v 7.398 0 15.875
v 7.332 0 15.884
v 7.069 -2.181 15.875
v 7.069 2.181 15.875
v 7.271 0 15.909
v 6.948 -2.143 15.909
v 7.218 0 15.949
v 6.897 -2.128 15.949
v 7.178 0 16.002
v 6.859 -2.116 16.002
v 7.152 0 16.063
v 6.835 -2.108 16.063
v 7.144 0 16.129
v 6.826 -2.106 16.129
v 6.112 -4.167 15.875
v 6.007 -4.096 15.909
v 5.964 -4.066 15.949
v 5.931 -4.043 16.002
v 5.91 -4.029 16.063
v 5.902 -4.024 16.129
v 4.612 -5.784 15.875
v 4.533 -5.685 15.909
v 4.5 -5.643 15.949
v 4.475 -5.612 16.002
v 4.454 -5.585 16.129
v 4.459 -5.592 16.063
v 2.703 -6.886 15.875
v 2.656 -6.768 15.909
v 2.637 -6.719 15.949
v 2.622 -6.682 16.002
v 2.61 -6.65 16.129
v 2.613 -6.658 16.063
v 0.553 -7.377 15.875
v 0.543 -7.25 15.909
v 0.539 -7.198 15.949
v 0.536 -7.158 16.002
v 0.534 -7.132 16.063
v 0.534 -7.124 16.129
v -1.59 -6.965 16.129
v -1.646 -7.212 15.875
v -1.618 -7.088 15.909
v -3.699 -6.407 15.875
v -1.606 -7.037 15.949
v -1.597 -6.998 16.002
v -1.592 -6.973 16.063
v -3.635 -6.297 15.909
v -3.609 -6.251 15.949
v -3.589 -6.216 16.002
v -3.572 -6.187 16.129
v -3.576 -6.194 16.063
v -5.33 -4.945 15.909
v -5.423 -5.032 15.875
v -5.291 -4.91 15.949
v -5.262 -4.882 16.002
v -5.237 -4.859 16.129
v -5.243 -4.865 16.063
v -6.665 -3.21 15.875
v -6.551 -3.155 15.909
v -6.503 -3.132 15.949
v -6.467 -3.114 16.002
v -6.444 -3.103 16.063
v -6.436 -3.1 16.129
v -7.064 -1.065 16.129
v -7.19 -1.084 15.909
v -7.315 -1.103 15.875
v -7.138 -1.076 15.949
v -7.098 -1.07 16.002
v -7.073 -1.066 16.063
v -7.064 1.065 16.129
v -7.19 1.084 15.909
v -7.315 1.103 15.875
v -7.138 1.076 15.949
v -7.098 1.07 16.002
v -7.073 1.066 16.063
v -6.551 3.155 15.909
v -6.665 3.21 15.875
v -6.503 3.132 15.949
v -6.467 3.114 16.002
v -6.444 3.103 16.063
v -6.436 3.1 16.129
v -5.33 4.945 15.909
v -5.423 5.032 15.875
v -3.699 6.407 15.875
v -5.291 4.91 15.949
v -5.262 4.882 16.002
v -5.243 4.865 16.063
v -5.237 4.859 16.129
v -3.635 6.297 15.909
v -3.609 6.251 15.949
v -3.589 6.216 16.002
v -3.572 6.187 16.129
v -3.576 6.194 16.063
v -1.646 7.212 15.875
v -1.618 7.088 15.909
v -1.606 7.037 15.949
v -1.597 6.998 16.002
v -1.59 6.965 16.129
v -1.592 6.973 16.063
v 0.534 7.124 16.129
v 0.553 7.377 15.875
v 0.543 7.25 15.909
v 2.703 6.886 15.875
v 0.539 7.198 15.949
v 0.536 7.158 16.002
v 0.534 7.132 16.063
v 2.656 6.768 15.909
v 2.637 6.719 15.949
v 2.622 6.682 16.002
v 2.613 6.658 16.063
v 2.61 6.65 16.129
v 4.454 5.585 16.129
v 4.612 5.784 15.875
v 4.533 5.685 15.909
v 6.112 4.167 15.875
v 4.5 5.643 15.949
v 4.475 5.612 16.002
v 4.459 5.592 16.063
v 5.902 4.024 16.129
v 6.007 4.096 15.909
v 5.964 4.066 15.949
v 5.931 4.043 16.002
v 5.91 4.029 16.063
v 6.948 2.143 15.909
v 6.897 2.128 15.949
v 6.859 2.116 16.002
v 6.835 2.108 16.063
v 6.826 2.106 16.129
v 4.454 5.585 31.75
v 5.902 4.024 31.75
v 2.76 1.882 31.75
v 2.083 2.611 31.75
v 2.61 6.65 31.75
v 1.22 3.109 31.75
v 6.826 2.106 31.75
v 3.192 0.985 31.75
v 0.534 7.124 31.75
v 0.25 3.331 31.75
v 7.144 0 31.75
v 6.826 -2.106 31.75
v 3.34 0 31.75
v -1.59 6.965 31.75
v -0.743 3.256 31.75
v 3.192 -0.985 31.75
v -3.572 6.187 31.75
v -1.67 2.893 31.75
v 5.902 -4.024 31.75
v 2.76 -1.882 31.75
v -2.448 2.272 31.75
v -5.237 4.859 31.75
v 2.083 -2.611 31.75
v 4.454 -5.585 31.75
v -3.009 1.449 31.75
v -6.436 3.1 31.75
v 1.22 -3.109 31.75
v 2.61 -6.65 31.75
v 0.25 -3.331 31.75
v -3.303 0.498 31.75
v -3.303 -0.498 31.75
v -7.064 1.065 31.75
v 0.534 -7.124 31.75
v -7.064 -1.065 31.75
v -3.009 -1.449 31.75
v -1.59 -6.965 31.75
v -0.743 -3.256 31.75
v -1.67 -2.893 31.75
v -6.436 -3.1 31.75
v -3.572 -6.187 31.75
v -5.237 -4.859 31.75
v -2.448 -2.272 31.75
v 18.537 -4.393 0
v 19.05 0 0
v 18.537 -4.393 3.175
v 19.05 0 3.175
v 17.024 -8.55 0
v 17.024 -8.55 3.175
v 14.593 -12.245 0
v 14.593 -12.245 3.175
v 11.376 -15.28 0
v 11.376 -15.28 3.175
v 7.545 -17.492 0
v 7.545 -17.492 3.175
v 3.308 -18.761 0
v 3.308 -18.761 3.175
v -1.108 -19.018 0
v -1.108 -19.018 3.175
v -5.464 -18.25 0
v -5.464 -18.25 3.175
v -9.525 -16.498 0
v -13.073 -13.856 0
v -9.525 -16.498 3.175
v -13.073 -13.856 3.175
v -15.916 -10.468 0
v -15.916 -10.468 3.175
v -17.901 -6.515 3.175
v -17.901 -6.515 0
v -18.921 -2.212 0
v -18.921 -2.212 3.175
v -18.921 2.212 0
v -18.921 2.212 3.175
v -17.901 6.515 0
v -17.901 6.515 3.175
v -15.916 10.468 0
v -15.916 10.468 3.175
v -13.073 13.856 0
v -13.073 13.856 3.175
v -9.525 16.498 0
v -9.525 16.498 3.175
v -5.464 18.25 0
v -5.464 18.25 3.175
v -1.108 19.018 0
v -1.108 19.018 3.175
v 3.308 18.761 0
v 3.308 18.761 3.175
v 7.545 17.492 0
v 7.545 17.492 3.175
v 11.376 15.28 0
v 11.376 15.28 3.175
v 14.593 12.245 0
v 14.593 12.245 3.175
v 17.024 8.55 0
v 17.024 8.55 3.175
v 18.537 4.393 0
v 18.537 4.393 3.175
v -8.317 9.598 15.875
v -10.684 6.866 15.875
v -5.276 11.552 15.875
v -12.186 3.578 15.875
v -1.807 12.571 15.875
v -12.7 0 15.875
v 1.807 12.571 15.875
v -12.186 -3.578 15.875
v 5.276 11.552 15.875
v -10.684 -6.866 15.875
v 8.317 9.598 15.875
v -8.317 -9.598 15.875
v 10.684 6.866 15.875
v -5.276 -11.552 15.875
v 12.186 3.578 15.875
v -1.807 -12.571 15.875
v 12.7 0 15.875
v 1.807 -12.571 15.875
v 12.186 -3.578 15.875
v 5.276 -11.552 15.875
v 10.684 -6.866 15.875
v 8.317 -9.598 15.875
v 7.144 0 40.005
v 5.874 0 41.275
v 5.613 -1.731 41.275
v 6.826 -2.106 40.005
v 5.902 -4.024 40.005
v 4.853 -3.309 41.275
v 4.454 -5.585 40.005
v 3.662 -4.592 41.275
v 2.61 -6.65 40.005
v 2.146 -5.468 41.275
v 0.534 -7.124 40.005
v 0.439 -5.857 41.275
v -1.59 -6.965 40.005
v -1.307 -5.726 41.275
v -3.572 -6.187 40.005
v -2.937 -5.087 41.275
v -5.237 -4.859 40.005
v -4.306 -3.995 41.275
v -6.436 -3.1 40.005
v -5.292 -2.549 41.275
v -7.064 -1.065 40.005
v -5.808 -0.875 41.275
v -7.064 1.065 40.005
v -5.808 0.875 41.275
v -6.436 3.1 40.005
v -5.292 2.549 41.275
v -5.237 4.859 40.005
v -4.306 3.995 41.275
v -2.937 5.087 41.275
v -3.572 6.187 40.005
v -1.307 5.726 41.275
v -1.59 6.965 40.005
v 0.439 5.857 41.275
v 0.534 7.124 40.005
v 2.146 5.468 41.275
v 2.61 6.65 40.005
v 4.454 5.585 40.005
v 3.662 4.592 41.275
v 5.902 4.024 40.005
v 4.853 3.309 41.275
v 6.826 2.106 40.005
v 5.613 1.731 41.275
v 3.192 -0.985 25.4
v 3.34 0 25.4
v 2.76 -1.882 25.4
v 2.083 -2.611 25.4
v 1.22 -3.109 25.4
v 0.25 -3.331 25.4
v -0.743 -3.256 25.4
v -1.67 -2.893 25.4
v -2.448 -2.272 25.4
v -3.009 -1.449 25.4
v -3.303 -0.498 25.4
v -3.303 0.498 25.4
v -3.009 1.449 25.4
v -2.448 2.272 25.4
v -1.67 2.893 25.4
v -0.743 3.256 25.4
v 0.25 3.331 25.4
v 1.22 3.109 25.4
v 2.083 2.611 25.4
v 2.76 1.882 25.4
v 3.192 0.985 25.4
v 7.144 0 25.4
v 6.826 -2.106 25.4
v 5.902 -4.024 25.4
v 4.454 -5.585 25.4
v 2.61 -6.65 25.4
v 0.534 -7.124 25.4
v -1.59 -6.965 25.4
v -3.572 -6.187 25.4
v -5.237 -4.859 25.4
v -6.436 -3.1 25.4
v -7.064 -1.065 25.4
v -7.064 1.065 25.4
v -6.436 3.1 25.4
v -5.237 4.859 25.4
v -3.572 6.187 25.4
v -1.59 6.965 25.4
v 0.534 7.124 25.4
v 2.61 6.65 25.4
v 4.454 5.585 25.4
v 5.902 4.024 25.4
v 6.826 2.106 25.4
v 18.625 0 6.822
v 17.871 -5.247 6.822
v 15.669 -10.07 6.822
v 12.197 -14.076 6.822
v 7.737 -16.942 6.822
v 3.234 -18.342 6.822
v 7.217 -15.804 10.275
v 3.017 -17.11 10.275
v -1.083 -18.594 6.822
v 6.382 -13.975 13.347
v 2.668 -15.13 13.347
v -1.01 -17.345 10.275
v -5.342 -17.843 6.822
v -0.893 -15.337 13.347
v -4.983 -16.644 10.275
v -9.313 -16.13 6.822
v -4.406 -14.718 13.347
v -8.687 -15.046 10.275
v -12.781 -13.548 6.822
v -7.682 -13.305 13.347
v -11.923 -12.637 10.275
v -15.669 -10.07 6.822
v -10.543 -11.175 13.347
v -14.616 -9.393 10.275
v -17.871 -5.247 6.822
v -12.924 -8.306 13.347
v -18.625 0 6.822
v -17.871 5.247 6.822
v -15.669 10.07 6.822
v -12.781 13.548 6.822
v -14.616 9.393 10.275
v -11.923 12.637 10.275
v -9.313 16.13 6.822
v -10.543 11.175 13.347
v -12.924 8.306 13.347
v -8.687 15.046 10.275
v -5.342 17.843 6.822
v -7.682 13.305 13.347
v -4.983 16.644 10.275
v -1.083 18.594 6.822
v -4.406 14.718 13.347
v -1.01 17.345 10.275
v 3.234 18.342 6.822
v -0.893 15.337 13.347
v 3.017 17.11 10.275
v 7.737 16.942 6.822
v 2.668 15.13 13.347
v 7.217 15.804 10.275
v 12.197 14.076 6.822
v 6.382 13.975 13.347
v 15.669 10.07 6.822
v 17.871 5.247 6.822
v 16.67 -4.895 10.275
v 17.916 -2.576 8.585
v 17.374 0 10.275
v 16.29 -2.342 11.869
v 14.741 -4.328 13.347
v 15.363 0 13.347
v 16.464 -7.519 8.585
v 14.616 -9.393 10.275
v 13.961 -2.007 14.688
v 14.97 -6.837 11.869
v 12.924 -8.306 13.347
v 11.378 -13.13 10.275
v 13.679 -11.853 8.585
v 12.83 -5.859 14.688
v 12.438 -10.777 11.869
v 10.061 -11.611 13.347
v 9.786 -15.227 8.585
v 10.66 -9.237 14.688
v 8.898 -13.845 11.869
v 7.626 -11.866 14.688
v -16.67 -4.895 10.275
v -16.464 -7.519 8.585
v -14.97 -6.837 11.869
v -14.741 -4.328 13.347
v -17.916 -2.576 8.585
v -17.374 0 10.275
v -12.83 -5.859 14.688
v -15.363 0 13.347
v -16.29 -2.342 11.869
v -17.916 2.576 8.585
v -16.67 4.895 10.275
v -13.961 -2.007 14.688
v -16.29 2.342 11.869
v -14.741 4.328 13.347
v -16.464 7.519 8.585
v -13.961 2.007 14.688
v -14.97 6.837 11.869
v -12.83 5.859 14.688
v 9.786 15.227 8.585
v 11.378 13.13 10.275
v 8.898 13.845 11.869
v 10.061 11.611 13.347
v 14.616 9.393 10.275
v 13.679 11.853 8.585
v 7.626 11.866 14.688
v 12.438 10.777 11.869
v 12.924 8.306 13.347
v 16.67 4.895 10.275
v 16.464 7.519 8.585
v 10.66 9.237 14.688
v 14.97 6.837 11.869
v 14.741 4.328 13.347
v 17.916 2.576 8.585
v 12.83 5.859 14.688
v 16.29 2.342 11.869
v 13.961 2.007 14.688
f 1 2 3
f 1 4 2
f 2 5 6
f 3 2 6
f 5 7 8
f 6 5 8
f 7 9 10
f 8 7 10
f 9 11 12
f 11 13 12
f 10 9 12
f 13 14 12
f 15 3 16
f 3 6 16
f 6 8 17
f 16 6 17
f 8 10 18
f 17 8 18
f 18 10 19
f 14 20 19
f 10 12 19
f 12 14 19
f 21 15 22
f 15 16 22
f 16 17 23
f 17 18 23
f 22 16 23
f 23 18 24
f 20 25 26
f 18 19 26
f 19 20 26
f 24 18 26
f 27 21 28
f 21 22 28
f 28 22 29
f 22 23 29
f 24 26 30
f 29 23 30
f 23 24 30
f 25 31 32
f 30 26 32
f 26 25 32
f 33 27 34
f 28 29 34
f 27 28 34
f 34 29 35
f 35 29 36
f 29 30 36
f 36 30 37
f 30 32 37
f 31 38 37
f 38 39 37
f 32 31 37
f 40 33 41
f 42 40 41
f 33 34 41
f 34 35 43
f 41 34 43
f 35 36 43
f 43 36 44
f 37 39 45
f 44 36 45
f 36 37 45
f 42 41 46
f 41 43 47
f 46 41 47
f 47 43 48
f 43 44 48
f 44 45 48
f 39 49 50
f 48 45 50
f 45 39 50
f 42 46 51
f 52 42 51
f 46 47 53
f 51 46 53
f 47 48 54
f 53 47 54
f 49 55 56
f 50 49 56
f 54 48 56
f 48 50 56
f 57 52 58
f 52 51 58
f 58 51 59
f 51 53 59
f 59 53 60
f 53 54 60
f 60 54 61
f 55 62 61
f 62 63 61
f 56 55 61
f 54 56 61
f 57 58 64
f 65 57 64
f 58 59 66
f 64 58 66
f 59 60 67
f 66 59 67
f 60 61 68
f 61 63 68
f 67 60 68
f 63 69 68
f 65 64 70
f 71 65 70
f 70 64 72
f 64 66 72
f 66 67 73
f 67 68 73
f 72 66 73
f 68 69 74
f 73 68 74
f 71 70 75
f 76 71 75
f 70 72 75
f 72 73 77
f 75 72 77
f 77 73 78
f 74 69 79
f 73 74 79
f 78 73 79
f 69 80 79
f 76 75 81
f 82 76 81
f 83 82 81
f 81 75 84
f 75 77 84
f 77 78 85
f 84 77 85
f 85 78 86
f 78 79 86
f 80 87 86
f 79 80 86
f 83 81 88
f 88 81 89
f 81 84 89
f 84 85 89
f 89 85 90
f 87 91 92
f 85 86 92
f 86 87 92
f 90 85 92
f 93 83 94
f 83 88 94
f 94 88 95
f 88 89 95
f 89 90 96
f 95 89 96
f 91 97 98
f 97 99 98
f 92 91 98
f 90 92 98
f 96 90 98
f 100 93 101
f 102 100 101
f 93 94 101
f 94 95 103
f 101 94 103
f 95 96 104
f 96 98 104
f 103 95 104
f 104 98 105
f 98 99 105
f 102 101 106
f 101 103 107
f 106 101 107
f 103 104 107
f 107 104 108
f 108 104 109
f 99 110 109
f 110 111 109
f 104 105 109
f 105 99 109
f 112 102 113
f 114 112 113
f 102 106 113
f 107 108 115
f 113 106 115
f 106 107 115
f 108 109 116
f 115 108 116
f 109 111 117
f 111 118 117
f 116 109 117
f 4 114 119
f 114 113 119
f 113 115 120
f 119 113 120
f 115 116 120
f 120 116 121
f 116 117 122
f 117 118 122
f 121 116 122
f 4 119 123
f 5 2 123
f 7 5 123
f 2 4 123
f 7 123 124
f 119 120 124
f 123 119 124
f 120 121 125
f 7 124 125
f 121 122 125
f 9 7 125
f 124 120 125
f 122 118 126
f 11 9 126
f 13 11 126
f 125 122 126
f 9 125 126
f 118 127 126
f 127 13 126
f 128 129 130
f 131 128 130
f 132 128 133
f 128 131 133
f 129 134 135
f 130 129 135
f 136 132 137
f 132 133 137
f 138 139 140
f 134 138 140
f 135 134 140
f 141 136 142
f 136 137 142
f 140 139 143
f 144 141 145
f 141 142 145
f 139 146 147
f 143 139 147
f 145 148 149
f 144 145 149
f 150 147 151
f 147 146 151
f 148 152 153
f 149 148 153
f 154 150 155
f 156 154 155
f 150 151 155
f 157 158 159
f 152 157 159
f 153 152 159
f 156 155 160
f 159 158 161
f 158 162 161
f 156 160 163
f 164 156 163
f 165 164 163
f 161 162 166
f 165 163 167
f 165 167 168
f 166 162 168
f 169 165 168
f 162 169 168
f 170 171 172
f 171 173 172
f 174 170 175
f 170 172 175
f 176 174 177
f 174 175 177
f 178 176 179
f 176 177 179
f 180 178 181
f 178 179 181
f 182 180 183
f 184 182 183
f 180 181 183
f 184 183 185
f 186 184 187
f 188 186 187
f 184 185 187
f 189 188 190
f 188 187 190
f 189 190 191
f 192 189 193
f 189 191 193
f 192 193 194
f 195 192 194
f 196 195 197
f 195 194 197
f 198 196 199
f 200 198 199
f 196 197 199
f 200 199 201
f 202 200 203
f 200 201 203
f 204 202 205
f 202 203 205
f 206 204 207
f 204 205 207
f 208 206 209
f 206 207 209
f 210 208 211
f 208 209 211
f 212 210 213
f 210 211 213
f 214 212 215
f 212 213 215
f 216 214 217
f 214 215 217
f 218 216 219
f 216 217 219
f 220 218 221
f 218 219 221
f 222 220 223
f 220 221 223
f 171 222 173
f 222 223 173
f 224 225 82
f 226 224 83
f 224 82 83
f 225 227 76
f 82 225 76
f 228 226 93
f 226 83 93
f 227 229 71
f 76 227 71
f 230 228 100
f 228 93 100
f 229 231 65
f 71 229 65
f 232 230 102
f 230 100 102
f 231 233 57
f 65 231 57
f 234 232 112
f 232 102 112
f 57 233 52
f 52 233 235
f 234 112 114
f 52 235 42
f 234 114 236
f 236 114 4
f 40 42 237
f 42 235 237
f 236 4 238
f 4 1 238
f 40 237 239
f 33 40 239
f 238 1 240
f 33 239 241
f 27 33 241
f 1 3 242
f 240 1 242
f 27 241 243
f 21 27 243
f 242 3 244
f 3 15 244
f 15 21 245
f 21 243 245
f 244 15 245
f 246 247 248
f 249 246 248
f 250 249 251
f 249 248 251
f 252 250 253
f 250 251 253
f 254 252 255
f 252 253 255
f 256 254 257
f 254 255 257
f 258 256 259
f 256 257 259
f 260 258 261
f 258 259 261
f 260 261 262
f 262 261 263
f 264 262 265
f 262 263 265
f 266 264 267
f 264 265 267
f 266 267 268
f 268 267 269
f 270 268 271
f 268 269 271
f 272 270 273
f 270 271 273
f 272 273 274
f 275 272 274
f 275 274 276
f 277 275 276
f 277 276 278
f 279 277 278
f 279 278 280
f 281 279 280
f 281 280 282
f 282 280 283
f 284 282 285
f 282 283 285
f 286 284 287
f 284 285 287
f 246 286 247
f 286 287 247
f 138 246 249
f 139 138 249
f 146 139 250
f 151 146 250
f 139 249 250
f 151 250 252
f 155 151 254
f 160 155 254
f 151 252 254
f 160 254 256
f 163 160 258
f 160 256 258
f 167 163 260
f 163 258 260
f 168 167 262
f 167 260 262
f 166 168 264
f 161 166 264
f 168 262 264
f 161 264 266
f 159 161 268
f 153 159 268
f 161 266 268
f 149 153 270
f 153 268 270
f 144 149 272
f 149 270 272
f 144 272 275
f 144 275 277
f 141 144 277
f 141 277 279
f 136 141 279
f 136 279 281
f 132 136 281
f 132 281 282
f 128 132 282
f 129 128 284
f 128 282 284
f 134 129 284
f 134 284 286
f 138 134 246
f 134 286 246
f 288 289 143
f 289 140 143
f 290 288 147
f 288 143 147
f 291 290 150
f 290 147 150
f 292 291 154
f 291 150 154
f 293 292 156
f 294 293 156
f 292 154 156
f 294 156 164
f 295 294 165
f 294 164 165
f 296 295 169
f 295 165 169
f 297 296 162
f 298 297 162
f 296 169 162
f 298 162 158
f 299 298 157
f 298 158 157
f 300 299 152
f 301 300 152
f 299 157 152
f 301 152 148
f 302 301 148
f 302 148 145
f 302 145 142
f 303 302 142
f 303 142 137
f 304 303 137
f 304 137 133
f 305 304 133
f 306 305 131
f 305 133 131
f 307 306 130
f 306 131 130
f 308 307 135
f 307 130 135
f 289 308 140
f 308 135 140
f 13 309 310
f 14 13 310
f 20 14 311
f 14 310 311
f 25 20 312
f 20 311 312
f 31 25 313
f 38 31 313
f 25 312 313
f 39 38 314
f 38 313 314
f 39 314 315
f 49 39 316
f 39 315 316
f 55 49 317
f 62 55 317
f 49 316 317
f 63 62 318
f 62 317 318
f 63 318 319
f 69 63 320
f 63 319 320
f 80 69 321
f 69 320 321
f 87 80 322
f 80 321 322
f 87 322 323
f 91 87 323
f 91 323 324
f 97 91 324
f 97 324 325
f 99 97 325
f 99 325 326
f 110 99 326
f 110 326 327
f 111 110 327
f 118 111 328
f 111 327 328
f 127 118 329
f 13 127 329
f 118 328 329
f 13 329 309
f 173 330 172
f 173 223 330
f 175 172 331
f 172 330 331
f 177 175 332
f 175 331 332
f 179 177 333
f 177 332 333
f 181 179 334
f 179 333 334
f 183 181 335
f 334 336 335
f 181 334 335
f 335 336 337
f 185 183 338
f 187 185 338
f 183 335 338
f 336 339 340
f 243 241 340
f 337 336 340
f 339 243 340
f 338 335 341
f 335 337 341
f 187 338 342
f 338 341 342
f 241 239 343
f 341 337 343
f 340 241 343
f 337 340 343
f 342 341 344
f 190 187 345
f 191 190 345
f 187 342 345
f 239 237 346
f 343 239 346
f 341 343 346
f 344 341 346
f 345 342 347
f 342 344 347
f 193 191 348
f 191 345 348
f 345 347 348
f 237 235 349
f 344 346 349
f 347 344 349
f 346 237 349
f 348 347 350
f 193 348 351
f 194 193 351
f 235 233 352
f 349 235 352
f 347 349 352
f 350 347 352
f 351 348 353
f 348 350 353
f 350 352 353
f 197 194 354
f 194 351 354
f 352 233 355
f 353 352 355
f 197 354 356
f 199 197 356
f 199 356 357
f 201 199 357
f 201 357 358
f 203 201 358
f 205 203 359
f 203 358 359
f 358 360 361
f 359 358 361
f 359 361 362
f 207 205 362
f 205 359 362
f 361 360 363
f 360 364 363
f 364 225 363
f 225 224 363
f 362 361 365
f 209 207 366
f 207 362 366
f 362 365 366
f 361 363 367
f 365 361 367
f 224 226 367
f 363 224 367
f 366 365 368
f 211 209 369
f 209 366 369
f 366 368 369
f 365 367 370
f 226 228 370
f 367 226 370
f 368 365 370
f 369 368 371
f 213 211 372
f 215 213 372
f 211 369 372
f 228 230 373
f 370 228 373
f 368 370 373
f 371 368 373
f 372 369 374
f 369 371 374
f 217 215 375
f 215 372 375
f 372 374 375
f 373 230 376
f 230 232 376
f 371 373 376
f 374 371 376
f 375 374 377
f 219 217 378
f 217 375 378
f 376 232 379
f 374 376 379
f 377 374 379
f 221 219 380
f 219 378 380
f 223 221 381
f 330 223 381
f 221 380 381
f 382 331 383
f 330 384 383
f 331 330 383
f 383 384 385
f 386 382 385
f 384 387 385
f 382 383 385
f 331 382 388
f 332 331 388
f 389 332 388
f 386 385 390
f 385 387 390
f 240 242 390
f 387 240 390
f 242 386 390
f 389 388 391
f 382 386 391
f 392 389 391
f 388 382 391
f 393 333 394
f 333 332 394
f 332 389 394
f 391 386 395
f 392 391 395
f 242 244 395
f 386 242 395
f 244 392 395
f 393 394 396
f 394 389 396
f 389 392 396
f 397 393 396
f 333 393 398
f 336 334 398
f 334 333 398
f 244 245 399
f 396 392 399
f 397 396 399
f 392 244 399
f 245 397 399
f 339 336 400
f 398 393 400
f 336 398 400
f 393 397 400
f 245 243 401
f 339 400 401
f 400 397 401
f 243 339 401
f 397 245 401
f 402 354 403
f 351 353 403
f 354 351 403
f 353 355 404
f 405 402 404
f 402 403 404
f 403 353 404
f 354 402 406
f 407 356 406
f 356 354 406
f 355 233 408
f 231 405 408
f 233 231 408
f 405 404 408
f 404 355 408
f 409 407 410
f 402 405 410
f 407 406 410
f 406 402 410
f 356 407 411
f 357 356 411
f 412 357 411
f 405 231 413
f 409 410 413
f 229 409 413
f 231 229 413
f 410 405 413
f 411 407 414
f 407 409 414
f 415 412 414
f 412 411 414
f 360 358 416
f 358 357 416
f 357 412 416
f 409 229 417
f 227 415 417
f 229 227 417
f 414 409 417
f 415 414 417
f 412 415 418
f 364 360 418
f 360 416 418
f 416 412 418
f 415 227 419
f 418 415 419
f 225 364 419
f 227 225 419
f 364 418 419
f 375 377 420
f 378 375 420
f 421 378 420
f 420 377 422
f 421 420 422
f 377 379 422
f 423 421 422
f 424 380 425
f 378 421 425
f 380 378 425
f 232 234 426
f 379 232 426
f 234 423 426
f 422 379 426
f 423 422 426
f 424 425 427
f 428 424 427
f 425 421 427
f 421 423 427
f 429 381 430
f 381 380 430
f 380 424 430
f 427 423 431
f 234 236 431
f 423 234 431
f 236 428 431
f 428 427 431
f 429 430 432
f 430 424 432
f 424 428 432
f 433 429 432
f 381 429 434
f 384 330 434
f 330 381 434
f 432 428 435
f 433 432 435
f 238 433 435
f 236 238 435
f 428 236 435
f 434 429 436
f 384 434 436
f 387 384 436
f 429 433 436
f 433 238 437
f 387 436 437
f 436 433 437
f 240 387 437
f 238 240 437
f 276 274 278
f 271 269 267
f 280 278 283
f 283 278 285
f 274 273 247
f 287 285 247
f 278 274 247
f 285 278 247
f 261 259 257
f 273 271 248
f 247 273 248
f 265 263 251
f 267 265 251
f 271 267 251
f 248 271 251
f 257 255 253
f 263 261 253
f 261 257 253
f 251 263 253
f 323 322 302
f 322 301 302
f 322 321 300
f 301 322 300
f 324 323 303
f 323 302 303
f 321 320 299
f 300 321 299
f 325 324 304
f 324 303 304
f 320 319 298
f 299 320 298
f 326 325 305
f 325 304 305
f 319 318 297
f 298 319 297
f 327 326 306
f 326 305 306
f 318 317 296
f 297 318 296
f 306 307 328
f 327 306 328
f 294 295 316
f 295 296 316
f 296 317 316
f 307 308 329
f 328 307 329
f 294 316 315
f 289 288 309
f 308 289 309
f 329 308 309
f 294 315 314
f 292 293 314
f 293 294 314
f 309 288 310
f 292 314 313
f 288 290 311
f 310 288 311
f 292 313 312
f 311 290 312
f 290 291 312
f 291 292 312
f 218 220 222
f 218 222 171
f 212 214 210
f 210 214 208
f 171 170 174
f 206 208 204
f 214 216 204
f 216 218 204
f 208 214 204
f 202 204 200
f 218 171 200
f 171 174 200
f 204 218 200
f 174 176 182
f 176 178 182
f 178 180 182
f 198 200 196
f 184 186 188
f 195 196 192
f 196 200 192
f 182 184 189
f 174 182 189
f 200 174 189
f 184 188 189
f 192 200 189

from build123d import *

# Parameters (mm, degrees)
F2_R     = 0.254
F3_SIZE2 = 1.27
F3_SIZE  = 1.27


with BuildPart() as f1:
    # F0 (on Front) → F1 (revolve)
    with BuildSketch(Plane.XZ):
        with BuildLine():
            Line((0, 41.275), (0, 0))
            Line((0, 0), (19.05, 0))
            Line((19.05, 0), (19.05, 3.175))
            ThreePointArc((19.05, 3.175), (17.374032, 10.274516), (12.7, 15.875))
            Line((12.7, 15.875), (7.14375, 15.875))
            Line((7.14375, 15.875), (7.14375, 25.4))
            Line((7.14375, 25.4), (3.3401, 25.4))
            Line((3.3401, 25.4), (3.3401, 31.75))
            Line((3.3401, 31.75), (7.14375, 31.75))
            Line((7.14375, 31.75), (7.14375, 41.275))
            Line((7.14375, 41.275), (0, 41.275))
        make_face()
    revolve(axis=Axis((0, 0, -1.440535), (0, 0, -1)))

    # F2
    f2_edges = [f1.edges().sort_by_distance(p)[0] for p in [
        (-7.14375, 0, 15.875),
    ]]
    fillet(f2_edges, radius=F2_R)

    # F3
    f3_edges = [f1.edges().sort_by_distance(p)[0] for p in [
        (-7.14375, 0, 41.275),
    ]]
    chamfer(f3_edges, length=F3_SIZE, length2=F3_SIZE2)


solid = f1.part
